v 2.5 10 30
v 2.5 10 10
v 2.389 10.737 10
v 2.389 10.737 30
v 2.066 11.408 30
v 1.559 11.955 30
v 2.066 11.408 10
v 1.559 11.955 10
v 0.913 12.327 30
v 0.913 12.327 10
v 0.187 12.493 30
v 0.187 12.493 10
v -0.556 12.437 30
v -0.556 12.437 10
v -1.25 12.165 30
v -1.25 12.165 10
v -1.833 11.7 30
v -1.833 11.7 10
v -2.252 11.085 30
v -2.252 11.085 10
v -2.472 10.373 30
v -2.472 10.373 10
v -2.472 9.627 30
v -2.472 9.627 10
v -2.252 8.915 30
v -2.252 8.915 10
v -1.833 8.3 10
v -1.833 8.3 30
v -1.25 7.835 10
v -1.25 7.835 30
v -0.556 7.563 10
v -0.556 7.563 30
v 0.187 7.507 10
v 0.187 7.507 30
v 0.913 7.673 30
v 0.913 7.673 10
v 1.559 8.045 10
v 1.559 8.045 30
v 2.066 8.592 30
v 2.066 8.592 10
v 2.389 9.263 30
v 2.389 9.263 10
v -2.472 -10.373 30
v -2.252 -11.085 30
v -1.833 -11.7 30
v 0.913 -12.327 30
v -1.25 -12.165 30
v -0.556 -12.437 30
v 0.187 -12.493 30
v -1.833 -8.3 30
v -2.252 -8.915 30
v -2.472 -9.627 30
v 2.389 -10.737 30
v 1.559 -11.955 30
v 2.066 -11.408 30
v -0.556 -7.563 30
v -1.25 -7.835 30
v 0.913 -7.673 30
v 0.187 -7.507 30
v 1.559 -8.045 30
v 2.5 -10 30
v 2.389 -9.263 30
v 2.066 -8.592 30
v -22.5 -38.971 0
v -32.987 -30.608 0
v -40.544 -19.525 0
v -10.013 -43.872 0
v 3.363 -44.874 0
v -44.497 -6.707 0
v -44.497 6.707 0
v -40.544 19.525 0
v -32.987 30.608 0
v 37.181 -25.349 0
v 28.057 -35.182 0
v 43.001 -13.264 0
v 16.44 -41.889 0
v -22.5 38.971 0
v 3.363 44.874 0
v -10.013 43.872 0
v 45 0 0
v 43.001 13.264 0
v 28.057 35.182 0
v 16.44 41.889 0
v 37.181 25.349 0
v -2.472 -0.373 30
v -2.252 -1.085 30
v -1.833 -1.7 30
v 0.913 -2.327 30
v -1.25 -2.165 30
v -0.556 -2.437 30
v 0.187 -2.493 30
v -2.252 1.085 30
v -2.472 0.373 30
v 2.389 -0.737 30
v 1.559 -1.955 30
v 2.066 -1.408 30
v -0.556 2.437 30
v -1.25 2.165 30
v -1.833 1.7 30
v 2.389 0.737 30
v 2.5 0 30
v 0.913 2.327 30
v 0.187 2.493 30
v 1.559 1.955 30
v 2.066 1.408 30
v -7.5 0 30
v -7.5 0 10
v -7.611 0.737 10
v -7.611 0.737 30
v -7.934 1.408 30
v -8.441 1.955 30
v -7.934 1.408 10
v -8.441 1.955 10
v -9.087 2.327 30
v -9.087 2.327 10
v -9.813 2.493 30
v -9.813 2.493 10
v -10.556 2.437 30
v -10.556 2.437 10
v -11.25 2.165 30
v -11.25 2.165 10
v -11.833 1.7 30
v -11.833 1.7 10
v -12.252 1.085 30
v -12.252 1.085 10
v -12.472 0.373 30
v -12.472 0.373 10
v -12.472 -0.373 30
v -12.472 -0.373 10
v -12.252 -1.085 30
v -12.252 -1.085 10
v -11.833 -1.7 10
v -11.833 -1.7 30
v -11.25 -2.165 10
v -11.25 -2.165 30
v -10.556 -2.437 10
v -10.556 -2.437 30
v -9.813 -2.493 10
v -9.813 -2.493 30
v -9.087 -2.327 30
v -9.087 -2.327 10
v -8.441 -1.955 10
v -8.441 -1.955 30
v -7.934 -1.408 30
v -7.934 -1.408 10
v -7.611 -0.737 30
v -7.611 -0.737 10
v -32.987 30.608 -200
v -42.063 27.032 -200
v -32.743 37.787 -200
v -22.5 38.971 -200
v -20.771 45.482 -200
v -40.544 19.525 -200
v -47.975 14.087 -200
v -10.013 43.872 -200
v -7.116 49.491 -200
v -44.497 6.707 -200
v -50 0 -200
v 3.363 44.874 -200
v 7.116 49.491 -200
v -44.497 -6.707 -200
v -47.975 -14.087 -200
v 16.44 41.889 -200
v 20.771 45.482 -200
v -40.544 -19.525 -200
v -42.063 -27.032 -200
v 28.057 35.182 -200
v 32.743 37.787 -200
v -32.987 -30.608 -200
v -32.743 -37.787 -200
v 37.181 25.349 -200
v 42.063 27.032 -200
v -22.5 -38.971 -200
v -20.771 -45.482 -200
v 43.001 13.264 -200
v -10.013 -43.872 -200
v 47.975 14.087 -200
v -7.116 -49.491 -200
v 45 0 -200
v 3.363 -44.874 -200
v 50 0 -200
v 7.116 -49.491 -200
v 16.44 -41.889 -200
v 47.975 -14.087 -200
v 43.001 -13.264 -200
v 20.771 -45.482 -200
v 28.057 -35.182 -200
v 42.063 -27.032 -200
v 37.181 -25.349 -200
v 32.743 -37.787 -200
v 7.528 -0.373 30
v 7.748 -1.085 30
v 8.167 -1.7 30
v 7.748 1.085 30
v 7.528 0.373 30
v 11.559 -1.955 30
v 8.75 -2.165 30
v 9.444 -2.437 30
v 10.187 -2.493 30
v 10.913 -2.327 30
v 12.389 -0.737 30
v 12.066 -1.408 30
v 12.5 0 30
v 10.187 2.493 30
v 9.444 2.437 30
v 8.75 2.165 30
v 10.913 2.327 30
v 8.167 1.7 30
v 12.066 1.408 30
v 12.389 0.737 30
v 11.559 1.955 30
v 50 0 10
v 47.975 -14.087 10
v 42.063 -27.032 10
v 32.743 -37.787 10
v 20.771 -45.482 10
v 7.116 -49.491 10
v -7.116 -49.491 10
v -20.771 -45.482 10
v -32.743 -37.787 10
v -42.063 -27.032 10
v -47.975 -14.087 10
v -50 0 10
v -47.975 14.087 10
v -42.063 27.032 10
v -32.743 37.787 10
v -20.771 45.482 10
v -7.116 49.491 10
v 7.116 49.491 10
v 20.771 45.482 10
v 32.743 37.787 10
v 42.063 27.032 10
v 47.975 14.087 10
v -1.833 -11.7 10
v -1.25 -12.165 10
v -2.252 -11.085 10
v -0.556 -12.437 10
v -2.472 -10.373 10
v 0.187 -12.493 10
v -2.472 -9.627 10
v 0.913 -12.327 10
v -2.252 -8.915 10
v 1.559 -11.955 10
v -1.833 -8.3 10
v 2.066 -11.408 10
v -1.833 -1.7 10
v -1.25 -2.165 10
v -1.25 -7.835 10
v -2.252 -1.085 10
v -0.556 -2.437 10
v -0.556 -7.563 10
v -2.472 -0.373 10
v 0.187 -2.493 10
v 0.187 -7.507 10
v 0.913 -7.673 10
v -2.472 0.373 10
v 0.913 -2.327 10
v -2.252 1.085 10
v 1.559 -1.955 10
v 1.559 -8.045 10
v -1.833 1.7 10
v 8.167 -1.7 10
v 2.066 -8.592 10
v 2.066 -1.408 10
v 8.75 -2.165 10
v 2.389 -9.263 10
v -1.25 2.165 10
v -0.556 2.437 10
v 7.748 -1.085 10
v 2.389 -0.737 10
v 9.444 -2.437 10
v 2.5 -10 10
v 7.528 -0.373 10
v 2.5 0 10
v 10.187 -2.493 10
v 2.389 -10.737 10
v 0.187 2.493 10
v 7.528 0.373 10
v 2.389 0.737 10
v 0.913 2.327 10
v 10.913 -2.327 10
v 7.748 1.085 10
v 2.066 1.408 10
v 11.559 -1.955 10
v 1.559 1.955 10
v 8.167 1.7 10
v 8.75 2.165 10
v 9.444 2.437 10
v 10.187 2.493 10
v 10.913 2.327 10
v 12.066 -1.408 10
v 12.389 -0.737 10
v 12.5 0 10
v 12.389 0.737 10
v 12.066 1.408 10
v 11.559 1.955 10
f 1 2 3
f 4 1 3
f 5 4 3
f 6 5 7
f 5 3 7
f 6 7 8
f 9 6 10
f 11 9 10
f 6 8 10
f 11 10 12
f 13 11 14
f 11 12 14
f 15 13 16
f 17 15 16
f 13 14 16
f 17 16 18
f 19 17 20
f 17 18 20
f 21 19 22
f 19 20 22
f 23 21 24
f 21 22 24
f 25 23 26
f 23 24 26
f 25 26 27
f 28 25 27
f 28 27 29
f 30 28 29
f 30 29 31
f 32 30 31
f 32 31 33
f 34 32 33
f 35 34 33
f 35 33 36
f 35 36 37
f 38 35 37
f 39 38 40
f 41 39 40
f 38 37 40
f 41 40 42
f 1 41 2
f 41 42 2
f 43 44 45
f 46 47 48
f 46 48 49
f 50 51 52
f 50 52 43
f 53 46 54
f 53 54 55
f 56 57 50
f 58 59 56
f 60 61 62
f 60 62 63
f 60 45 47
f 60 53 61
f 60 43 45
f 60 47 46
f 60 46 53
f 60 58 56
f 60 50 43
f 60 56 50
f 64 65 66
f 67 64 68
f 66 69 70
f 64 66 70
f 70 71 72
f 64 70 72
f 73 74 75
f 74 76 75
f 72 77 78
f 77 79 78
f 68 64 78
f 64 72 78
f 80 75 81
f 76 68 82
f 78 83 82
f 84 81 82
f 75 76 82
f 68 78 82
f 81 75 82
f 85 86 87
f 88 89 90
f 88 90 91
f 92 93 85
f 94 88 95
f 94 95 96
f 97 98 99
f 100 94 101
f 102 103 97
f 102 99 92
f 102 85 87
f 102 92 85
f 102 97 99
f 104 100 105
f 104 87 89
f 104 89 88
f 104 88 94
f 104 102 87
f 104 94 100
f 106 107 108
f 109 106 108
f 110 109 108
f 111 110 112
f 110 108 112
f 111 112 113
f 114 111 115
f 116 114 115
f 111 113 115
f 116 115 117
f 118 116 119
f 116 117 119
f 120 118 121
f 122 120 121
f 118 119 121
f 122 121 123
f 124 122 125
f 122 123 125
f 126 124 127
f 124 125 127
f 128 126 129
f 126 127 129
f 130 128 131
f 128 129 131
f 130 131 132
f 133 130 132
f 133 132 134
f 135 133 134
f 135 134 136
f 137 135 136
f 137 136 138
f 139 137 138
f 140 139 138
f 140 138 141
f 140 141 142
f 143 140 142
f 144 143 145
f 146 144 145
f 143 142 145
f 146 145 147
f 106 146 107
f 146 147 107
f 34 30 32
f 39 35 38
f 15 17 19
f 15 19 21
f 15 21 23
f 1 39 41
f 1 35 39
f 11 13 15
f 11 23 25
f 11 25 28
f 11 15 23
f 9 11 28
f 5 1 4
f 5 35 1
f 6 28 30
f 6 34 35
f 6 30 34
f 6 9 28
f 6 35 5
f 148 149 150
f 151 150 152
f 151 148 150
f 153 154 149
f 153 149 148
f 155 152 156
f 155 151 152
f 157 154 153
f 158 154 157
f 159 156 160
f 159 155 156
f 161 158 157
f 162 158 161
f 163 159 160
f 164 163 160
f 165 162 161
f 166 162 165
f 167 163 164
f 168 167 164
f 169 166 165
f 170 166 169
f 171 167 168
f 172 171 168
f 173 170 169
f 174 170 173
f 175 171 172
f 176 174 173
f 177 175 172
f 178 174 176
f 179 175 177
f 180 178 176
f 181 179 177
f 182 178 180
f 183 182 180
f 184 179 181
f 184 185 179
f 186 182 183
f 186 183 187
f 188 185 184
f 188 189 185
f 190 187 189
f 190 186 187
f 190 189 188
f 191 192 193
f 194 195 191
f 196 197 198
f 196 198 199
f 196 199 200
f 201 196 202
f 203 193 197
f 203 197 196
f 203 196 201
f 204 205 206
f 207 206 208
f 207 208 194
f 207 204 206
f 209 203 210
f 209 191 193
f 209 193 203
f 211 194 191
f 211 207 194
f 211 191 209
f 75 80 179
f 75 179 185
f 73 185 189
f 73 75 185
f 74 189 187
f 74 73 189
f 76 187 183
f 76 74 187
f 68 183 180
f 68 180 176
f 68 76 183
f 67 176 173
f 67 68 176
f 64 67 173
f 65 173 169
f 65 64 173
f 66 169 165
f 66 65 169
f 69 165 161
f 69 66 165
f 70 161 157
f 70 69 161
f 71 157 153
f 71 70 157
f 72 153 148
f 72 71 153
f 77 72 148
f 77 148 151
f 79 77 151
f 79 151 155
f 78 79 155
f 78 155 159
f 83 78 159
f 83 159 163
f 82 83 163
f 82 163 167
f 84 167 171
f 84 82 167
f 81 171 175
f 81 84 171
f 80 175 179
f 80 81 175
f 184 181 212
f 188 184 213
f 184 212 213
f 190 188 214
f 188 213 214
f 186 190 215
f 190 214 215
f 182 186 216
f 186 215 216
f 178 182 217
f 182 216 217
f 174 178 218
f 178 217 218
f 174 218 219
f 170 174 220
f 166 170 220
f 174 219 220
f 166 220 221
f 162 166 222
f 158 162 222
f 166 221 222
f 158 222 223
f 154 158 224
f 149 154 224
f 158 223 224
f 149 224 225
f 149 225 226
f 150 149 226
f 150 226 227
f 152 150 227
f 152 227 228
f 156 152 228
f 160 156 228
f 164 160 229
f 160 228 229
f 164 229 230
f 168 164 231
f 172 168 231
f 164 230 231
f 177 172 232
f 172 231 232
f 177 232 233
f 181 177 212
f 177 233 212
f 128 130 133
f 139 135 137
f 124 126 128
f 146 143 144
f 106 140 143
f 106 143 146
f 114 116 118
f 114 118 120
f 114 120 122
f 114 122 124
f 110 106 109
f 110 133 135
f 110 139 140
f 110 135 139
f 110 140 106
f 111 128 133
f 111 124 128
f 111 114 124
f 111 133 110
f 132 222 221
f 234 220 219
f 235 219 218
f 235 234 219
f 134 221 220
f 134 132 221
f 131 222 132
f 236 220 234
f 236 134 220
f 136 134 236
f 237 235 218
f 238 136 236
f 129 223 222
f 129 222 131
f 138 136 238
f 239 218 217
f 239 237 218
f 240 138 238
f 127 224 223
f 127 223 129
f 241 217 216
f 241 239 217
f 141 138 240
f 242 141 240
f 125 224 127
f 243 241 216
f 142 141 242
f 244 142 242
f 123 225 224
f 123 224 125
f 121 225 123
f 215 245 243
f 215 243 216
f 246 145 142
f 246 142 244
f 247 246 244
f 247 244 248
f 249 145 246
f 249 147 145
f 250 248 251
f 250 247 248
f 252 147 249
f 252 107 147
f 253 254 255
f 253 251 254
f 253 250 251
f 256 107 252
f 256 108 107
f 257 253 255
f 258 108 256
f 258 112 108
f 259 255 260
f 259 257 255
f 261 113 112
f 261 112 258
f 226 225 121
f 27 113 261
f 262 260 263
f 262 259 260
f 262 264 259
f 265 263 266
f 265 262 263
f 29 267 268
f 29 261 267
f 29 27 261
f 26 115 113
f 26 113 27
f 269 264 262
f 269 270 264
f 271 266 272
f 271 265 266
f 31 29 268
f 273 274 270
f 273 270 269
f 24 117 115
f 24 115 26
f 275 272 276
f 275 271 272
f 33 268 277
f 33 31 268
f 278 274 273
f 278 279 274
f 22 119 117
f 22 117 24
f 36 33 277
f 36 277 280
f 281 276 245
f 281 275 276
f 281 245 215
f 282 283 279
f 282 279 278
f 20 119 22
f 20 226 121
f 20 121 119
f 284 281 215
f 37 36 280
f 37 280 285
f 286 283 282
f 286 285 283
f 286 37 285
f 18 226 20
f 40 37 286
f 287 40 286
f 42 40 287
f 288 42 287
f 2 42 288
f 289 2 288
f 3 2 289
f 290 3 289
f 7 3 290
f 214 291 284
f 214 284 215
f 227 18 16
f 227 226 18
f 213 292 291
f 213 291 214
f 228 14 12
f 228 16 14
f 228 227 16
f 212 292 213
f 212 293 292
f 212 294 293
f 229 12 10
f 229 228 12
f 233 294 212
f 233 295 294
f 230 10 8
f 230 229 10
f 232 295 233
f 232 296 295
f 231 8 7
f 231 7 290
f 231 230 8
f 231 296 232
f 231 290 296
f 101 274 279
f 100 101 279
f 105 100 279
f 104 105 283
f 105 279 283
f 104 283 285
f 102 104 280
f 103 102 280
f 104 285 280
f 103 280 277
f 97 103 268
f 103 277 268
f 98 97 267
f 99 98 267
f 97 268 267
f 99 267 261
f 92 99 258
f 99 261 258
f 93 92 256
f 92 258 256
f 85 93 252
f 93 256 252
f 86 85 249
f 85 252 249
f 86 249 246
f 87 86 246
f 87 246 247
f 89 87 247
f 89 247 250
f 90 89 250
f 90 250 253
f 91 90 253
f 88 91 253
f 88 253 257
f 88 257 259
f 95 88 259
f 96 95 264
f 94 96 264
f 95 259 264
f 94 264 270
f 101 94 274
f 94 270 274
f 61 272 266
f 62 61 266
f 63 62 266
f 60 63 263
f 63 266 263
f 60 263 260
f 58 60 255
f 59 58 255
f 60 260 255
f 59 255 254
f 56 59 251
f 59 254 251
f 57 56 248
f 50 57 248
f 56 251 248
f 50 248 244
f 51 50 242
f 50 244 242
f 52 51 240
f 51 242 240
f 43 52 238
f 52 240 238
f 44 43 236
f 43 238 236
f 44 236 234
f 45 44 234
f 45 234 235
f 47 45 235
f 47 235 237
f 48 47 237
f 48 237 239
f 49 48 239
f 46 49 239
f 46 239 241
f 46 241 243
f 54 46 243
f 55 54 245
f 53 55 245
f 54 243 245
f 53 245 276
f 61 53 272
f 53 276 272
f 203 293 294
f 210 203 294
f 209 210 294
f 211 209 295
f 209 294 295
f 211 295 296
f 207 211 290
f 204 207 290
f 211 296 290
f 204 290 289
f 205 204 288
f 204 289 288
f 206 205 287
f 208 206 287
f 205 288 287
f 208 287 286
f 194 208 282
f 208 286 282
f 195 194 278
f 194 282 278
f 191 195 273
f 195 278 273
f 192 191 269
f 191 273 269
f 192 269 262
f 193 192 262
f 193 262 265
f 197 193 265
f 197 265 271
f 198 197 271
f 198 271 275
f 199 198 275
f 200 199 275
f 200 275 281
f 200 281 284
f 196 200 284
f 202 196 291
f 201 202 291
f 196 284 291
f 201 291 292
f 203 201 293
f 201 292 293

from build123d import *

# Parameters (mm, degrees)
F0_R     = 50
F1_DEPTH = 10
F2_R     = 50
F2_R_2   = 45
F3_DEPTH = 200
F4_R     = 2.5
F5_DEPTH = 20


with BuildPart() as f1:
    # F0 (on Top) → F1 (new body)
    with BuildSketch(Plane.XY):
        Circle(F0_R)
    extrude(amount=F1_DEPTH)

    # F2 (on face) → F3 (join)
    with BuildSketch(Plane(origin=(0, 0, 0), x_dir=(1, 0, 0), z_dir=(0, 0, -1))):
        Circle(F2_R)
        Circle(F2_R_2, mode=Mode.SUBTRACT)
    extrude(amount=F3_DEPTH)

    # F4 (on face) → F5 (join)
    with BuildSketch(Plane.XY.offset(10)):
        Circle(F4_R)
        with Locations((-10, 0)):
            Circle(F4_R)
        with Locations((0, 10)):
            Circle(F4_R)
        with Locations((10, 0)):
            Circle(F4_R)
        with Locations((0, -10)):
            Circle(F4_R)
    extrude(amount=F5_DEPTH)


solid = f1.part
